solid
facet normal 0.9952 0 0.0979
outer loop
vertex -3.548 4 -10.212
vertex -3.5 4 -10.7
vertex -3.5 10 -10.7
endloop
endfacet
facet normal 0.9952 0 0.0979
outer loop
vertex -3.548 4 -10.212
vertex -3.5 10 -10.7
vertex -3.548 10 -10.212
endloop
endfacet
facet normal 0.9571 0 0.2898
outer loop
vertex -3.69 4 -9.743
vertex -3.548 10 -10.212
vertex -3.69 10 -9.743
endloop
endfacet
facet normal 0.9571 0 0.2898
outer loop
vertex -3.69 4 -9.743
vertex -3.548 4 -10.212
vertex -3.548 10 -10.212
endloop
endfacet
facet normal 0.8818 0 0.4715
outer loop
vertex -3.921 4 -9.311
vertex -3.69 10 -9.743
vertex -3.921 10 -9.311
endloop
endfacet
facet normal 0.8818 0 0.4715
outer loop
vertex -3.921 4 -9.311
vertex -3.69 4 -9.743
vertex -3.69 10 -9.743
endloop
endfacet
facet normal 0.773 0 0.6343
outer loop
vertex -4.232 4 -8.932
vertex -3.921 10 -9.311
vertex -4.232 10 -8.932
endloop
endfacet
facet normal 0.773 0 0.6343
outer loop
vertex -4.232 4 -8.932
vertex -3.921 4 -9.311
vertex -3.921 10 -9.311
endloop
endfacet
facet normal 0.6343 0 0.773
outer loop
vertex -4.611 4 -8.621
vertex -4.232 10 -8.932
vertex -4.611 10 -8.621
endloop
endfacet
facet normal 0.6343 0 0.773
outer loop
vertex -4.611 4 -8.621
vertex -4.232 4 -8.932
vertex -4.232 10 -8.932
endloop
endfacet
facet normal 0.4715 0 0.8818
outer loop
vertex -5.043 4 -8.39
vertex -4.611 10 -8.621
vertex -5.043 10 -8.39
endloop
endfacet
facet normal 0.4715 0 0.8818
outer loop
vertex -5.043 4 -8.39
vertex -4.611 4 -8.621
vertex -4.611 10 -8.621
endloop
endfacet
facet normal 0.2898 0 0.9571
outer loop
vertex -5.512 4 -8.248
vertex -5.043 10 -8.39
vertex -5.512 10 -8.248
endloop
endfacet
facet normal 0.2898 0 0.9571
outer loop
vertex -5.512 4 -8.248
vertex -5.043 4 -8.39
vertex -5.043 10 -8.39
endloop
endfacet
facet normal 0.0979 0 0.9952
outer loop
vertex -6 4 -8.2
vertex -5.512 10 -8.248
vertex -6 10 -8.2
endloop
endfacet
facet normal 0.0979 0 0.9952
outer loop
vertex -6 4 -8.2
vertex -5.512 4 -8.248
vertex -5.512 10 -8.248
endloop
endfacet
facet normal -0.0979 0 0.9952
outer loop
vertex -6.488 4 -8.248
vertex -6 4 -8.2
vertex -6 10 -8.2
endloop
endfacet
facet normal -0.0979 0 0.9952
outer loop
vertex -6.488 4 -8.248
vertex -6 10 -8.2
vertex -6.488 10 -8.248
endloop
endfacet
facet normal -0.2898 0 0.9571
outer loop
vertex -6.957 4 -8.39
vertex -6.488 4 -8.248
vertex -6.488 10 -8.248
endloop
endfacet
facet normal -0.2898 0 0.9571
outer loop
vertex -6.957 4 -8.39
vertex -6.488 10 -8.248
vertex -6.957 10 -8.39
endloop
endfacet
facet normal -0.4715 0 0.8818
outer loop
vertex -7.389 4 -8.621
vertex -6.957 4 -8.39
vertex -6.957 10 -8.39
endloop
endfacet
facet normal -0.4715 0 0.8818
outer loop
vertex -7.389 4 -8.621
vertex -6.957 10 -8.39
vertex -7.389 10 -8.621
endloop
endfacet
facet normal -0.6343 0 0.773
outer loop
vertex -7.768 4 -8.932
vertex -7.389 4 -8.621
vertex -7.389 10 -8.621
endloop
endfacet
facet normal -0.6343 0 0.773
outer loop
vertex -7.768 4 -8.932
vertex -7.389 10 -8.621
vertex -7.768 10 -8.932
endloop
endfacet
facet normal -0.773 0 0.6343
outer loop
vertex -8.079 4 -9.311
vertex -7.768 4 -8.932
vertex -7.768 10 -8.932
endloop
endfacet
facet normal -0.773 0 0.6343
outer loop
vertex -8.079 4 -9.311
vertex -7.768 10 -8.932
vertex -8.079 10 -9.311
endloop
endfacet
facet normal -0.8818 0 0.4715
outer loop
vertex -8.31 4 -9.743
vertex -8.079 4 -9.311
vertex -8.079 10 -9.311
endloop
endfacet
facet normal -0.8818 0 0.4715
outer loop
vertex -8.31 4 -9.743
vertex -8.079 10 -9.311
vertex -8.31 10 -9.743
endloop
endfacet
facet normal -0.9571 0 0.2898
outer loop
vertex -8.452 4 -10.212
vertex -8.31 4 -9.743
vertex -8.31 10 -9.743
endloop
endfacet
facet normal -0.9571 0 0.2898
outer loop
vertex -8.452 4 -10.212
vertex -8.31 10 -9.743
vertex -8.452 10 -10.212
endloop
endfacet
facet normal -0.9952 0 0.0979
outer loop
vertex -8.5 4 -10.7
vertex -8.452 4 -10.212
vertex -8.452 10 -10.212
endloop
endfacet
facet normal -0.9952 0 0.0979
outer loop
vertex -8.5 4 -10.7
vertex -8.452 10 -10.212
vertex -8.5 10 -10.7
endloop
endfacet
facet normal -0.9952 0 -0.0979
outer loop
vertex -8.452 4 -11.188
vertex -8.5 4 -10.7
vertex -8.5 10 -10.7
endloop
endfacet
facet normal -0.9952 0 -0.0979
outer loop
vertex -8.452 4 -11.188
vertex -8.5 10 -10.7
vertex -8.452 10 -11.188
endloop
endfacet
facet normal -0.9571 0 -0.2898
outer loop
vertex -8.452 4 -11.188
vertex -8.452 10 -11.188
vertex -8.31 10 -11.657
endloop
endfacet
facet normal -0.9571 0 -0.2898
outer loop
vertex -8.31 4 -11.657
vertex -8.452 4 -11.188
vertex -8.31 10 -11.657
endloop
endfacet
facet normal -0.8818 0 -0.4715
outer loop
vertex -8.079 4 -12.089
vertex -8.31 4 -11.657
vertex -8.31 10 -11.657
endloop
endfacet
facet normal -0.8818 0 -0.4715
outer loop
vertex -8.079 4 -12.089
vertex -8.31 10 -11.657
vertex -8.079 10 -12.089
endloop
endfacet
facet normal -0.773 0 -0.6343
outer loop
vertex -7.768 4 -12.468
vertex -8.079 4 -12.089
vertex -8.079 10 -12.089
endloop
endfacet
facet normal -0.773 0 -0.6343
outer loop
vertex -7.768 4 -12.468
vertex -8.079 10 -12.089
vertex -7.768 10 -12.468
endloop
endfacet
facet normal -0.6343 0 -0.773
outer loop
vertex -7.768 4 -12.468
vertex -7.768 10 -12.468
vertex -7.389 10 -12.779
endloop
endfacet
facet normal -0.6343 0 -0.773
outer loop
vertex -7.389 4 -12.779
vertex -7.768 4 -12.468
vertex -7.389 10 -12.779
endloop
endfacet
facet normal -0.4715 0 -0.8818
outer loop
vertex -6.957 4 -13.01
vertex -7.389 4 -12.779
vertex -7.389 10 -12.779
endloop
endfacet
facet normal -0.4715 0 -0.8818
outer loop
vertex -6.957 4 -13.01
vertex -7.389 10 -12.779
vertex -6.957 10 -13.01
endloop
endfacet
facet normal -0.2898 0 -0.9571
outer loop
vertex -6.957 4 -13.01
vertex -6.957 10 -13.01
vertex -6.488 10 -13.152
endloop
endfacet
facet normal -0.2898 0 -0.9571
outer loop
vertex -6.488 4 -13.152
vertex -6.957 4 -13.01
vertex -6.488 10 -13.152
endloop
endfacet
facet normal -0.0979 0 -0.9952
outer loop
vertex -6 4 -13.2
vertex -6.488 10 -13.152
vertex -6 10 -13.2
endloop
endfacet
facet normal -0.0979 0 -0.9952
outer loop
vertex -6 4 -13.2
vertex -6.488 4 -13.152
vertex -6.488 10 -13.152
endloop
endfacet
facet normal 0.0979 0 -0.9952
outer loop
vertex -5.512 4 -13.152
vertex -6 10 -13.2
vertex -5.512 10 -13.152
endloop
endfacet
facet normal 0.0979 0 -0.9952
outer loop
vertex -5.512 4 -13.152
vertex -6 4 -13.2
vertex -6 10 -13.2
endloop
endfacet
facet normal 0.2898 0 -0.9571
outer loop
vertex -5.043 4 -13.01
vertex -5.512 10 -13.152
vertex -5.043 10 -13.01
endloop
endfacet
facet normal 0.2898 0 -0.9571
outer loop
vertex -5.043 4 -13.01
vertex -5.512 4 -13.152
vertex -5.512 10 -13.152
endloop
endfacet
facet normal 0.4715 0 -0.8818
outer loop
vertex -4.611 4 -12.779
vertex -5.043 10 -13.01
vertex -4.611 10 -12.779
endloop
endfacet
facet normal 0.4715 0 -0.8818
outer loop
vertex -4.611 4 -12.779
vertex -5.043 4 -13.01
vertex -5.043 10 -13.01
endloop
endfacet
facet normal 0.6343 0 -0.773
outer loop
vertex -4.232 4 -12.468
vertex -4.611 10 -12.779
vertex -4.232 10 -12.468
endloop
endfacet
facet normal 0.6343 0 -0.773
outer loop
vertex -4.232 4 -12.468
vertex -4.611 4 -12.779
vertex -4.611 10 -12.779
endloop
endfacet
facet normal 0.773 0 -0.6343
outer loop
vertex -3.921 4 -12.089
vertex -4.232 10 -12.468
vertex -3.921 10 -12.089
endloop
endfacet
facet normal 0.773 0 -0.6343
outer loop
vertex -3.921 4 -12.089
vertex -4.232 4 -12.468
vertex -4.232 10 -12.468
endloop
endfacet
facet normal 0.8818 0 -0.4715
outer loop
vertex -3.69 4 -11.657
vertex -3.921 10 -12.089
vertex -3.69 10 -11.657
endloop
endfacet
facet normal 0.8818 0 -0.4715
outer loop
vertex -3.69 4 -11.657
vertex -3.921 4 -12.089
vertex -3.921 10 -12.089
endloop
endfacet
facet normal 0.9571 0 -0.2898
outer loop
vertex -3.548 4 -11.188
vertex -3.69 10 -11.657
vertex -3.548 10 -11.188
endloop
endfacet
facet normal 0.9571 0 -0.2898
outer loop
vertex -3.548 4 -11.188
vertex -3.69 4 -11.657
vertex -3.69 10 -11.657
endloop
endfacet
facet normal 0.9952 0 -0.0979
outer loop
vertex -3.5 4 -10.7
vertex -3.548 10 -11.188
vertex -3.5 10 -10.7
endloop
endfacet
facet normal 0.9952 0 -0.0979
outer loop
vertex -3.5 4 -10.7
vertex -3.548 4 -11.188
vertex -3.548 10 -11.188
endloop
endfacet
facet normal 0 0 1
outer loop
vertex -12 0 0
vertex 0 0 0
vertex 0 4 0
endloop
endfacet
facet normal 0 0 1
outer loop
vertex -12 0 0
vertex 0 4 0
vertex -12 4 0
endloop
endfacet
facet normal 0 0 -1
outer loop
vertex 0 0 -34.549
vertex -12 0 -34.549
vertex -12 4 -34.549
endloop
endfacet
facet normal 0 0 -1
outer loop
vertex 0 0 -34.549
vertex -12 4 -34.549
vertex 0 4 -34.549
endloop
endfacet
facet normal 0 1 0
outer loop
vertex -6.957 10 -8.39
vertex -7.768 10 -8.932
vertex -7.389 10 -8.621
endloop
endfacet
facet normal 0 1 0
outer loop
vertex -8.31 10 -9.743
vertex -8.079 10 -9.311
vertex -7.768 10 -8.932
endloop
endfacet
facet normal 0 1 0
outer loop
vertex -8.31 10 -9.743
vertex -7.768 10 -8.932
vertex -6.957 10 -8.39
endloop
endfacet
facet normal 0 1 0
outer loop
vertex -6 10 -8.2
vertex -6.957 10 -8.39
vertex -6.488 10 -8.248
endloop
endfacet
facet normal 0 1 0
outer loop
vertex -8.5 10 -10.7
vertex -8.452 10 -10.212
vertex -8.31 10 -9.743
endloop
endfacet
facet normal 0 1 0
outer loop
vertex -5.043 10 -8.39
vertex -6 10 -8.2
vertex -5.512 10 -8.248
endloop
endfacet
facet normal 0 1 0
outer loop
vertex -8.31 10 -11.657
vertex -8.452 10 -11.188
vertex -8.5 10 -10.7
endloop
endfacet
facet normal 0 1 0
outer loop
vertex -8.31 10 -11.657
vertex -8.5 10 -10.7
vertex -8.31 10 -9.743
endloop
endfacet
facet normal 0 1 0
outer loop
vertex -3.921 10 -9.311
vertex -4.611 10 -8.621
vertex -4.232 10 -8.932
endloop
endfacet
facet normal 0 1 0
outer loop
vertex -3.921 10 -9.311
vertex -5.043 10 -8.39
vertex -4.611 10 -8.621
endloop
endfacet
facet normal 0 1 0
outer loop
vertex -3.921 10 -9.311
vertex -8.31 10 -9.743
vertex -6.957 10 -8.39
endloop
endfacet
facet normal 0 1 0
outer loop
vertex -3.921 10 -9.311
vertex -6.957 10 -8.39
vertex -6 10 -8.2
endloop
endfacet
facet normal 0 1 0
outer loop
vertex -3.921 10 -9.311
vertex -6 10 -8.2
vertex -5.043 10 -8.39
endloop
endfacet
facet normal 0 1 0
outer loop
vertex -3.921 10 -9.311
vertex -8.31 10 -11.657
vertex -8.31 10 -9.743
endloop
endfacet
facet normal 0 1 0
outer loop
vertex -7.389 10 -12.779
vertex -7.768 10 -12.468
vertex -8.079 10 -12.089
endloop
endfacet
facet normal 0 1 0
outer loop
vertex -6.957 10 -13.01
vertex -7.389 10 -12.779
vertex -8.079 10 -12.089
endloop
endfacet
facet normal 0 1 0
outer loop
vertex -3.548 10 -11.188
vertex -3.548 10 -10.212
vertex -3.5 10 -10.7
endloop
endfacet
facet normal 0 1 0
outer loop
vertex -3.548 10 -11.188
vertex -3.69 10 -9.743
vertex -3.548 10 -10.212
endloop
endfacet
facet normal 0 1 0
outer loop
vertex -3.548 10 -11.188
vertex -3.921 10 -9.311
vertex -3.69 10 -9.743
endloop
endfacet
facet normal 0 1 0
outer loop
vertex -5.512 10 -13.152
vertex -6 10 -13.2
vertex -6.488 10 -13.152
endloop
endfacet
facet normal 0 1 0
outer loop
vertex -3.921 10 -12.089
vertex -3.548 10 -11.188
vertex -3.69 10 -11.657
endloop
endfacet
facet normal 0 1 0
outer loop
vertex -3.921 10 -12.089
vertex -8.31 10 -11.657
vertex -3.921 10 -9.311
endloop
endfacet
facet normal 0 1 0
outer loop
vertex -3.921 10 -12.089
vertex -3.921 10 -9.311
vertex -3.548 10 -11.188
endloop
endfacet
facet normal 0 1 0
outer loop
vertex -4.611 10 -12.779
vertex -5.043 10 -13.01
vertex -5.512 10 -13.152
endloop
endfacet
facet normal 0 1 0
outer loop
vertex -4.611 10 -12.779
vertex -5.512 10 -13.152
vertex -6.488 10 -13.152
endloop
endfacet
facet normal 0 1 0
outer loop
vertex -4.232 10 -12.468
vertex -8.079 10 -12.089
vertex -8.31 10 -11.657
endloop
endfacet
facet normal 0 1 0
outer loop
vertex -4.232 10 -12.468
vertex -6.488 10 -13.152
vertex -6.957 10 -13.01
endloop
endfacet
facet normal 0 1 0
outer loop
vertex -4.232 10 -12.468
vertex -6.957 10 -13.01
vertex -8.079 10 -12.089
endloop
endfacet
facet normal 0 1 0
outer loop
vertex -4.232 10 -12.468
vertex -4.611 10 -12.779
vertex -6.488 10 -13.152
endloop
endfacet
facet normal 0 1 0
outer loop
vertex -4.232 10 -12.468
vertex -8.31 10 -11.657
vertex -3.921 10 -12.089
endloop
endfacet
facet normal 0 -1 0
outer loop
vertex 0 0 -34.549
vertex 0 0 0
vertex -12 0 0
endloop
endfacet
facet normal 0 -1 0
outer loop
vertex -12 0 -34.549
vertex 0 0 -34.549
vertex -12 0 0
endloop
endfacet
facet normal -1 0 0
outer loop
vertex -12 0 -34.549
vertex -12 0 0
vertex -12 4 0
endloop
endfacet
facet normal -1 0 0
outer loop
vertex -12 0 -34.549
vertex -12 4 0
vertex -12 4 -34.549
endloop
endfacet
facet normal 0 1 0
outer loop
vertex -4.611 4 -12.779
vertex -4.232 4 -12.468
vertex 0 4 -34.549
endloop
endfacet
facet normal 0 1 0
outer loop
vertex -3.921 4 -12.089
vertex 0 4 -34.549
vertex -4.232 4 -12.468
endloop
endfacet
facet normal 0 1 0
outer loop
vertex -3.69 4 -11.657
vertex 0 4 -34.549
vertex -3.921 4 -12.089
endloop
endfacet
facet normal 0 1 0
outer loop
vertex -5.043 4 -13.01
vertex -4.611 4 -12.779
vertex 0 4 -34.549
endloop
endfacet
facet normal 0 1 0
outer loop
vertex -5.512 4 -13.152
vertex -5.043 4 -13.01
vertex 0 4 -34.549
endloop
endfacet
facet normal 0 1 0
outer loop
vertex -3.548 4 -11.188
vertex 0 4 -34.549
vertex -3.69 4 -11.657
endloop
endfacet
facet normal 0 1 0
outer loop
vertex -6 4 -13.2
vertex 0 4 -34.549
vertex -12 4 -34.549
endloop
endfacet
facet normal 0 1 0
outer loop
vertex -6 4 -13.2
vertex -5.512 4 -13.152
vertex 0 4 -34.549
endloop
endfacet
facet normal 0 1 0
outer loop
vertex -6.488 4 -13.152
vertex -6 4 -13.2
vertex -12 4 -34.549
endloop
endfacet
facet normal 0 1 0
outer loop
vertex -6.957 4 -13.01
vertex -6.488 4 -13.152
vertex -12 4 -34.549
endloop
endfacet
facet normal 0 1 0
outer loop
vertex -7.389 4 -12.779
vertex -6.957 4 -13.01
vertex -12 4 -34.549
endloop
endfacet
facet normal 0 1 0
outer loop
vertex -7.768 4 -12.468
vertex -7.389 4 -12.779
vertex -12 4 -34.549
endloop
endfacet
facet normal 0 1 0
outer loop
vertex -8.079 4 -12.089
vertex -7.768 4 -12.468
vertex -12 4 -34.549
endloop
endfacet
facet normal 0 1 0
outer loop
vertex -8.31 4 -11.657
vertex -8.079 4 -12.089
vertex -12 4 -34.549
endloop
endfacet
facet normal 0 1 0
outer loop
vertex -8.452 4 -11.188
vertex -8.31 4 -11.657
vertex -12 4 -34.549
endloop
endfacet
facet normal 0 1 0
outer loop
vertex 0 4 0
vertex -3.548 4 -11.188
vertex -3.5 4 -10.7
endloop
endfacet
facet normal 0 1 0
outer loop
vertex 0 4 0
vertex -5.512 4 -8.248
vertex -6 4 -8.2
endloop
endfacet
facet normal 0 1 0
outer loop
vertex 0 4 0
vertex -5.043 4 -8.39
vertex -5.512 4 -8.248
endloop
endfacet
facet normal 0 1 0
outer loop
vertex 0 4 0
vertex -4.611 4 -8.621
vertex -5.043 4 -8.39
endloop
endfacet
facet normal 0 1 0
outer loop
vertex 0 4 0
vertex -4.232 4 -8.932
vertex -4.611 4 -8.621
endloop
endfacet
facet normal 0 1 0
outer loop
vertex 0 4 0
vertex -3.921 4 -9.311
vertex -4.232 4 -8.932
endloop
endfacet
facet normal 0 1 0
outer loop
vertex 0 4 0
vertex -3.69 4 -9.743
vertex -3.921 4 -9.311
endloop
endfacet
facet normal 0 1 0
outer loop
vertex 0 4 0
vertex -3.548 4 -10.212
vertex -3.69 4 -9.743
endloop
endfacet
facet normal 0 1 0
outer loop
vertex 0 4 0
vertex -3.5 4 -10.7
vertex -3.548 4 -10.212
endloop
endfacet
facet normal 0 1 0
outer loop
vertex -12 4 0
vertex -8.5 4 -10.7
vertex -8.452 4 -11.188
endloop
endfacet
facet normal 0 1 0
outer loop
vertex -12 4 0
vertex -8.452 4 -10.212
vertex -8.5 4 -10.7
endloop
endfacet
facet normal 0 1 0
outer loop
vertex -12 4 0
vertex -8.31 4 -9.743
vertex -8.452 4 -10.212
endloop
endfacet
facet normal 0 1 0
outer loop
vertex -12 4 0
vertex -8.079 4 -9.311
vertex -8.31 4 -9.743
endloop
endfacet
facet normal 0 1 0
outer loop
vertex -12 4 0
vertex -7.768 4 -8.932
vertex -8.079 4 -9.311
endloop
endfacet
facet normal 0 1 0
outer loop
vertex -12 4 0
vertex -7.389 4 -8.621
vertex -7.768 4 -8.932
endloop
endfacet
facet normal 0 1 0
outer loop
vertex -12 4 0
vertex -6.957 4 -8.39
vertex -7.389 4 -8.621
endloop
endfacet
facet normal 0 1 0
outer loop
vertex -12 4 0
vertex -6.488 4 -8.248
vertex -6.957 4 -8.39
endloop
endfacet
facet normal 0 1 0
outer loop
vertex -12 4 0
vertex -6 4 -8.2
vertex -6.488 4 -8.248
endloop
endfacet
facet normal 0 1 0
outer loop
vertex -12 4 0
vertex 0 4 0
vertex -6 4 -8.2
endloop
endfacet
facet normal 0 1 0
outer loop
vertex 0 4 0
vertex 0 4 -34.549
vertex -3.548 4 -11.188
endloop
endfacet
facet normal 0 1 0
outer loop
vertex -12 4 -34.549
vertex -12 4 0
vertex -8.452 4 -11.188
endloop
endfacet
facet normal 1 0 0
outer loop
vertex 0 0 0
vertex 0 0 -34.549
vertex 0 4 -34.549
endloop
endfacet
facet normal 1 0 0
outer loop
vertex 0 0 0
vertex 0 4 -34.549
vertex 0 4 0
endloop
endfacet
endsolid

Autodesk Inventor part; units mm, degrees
ref_plane "YZ Plane" through (0, 0, 0) normal (1, 0, 0) x (0, 1, 0)
ref_plane "XZ Plane" through (0, 0, 0) normal (0, 1, 0) x (-1, 0, 0)
ref_plane "XY Plane" through (0, 0, 0) normal (0, 0, 1) x (1, 0, 0)
sketch "Sketch6" plane through (0, 0, 0) normal (0, 1, 0) x (-1, 0, 0)
  line L0 (0, 0) -> (12, 0)
  line L1 (12, 0) -> (12, -34.549)
  line L2 (12, -34.549) -> (0, -34.549)
  line L3 (0, -34.549) -> (0, 0)
  dimension "d22" = 12
  dimension "d23" = 34.549
extrude "Extrusion6" add sketch "Sketch6" along normal blind 4
sketch "Sketch7" plane through (0, 4, 0) normal (0, 1, 0) x (1, 0, 0)
  line L0 (-12, 0) -> (0, 0) projected
  line L1 (0, 0) -> (-6, 0)
  line L2 (-6, 0) -> (-6, 10.7)
  line L3 (-6, 10.7) -> (0, 10.7)
  line L4 (0, 10.7) -> (0, 0)
  circle A0 centre (-6, 10.7) radius 2.5
  dimension "d26" = 6
  dimension "d27" = 10.7
  dimension "d28" = 5
extrude "Extrusion7" add sketch "Sketch7" along normal blind 6 contours A0 L3 L2 | L2 L3 A0
properties part number "filler"
